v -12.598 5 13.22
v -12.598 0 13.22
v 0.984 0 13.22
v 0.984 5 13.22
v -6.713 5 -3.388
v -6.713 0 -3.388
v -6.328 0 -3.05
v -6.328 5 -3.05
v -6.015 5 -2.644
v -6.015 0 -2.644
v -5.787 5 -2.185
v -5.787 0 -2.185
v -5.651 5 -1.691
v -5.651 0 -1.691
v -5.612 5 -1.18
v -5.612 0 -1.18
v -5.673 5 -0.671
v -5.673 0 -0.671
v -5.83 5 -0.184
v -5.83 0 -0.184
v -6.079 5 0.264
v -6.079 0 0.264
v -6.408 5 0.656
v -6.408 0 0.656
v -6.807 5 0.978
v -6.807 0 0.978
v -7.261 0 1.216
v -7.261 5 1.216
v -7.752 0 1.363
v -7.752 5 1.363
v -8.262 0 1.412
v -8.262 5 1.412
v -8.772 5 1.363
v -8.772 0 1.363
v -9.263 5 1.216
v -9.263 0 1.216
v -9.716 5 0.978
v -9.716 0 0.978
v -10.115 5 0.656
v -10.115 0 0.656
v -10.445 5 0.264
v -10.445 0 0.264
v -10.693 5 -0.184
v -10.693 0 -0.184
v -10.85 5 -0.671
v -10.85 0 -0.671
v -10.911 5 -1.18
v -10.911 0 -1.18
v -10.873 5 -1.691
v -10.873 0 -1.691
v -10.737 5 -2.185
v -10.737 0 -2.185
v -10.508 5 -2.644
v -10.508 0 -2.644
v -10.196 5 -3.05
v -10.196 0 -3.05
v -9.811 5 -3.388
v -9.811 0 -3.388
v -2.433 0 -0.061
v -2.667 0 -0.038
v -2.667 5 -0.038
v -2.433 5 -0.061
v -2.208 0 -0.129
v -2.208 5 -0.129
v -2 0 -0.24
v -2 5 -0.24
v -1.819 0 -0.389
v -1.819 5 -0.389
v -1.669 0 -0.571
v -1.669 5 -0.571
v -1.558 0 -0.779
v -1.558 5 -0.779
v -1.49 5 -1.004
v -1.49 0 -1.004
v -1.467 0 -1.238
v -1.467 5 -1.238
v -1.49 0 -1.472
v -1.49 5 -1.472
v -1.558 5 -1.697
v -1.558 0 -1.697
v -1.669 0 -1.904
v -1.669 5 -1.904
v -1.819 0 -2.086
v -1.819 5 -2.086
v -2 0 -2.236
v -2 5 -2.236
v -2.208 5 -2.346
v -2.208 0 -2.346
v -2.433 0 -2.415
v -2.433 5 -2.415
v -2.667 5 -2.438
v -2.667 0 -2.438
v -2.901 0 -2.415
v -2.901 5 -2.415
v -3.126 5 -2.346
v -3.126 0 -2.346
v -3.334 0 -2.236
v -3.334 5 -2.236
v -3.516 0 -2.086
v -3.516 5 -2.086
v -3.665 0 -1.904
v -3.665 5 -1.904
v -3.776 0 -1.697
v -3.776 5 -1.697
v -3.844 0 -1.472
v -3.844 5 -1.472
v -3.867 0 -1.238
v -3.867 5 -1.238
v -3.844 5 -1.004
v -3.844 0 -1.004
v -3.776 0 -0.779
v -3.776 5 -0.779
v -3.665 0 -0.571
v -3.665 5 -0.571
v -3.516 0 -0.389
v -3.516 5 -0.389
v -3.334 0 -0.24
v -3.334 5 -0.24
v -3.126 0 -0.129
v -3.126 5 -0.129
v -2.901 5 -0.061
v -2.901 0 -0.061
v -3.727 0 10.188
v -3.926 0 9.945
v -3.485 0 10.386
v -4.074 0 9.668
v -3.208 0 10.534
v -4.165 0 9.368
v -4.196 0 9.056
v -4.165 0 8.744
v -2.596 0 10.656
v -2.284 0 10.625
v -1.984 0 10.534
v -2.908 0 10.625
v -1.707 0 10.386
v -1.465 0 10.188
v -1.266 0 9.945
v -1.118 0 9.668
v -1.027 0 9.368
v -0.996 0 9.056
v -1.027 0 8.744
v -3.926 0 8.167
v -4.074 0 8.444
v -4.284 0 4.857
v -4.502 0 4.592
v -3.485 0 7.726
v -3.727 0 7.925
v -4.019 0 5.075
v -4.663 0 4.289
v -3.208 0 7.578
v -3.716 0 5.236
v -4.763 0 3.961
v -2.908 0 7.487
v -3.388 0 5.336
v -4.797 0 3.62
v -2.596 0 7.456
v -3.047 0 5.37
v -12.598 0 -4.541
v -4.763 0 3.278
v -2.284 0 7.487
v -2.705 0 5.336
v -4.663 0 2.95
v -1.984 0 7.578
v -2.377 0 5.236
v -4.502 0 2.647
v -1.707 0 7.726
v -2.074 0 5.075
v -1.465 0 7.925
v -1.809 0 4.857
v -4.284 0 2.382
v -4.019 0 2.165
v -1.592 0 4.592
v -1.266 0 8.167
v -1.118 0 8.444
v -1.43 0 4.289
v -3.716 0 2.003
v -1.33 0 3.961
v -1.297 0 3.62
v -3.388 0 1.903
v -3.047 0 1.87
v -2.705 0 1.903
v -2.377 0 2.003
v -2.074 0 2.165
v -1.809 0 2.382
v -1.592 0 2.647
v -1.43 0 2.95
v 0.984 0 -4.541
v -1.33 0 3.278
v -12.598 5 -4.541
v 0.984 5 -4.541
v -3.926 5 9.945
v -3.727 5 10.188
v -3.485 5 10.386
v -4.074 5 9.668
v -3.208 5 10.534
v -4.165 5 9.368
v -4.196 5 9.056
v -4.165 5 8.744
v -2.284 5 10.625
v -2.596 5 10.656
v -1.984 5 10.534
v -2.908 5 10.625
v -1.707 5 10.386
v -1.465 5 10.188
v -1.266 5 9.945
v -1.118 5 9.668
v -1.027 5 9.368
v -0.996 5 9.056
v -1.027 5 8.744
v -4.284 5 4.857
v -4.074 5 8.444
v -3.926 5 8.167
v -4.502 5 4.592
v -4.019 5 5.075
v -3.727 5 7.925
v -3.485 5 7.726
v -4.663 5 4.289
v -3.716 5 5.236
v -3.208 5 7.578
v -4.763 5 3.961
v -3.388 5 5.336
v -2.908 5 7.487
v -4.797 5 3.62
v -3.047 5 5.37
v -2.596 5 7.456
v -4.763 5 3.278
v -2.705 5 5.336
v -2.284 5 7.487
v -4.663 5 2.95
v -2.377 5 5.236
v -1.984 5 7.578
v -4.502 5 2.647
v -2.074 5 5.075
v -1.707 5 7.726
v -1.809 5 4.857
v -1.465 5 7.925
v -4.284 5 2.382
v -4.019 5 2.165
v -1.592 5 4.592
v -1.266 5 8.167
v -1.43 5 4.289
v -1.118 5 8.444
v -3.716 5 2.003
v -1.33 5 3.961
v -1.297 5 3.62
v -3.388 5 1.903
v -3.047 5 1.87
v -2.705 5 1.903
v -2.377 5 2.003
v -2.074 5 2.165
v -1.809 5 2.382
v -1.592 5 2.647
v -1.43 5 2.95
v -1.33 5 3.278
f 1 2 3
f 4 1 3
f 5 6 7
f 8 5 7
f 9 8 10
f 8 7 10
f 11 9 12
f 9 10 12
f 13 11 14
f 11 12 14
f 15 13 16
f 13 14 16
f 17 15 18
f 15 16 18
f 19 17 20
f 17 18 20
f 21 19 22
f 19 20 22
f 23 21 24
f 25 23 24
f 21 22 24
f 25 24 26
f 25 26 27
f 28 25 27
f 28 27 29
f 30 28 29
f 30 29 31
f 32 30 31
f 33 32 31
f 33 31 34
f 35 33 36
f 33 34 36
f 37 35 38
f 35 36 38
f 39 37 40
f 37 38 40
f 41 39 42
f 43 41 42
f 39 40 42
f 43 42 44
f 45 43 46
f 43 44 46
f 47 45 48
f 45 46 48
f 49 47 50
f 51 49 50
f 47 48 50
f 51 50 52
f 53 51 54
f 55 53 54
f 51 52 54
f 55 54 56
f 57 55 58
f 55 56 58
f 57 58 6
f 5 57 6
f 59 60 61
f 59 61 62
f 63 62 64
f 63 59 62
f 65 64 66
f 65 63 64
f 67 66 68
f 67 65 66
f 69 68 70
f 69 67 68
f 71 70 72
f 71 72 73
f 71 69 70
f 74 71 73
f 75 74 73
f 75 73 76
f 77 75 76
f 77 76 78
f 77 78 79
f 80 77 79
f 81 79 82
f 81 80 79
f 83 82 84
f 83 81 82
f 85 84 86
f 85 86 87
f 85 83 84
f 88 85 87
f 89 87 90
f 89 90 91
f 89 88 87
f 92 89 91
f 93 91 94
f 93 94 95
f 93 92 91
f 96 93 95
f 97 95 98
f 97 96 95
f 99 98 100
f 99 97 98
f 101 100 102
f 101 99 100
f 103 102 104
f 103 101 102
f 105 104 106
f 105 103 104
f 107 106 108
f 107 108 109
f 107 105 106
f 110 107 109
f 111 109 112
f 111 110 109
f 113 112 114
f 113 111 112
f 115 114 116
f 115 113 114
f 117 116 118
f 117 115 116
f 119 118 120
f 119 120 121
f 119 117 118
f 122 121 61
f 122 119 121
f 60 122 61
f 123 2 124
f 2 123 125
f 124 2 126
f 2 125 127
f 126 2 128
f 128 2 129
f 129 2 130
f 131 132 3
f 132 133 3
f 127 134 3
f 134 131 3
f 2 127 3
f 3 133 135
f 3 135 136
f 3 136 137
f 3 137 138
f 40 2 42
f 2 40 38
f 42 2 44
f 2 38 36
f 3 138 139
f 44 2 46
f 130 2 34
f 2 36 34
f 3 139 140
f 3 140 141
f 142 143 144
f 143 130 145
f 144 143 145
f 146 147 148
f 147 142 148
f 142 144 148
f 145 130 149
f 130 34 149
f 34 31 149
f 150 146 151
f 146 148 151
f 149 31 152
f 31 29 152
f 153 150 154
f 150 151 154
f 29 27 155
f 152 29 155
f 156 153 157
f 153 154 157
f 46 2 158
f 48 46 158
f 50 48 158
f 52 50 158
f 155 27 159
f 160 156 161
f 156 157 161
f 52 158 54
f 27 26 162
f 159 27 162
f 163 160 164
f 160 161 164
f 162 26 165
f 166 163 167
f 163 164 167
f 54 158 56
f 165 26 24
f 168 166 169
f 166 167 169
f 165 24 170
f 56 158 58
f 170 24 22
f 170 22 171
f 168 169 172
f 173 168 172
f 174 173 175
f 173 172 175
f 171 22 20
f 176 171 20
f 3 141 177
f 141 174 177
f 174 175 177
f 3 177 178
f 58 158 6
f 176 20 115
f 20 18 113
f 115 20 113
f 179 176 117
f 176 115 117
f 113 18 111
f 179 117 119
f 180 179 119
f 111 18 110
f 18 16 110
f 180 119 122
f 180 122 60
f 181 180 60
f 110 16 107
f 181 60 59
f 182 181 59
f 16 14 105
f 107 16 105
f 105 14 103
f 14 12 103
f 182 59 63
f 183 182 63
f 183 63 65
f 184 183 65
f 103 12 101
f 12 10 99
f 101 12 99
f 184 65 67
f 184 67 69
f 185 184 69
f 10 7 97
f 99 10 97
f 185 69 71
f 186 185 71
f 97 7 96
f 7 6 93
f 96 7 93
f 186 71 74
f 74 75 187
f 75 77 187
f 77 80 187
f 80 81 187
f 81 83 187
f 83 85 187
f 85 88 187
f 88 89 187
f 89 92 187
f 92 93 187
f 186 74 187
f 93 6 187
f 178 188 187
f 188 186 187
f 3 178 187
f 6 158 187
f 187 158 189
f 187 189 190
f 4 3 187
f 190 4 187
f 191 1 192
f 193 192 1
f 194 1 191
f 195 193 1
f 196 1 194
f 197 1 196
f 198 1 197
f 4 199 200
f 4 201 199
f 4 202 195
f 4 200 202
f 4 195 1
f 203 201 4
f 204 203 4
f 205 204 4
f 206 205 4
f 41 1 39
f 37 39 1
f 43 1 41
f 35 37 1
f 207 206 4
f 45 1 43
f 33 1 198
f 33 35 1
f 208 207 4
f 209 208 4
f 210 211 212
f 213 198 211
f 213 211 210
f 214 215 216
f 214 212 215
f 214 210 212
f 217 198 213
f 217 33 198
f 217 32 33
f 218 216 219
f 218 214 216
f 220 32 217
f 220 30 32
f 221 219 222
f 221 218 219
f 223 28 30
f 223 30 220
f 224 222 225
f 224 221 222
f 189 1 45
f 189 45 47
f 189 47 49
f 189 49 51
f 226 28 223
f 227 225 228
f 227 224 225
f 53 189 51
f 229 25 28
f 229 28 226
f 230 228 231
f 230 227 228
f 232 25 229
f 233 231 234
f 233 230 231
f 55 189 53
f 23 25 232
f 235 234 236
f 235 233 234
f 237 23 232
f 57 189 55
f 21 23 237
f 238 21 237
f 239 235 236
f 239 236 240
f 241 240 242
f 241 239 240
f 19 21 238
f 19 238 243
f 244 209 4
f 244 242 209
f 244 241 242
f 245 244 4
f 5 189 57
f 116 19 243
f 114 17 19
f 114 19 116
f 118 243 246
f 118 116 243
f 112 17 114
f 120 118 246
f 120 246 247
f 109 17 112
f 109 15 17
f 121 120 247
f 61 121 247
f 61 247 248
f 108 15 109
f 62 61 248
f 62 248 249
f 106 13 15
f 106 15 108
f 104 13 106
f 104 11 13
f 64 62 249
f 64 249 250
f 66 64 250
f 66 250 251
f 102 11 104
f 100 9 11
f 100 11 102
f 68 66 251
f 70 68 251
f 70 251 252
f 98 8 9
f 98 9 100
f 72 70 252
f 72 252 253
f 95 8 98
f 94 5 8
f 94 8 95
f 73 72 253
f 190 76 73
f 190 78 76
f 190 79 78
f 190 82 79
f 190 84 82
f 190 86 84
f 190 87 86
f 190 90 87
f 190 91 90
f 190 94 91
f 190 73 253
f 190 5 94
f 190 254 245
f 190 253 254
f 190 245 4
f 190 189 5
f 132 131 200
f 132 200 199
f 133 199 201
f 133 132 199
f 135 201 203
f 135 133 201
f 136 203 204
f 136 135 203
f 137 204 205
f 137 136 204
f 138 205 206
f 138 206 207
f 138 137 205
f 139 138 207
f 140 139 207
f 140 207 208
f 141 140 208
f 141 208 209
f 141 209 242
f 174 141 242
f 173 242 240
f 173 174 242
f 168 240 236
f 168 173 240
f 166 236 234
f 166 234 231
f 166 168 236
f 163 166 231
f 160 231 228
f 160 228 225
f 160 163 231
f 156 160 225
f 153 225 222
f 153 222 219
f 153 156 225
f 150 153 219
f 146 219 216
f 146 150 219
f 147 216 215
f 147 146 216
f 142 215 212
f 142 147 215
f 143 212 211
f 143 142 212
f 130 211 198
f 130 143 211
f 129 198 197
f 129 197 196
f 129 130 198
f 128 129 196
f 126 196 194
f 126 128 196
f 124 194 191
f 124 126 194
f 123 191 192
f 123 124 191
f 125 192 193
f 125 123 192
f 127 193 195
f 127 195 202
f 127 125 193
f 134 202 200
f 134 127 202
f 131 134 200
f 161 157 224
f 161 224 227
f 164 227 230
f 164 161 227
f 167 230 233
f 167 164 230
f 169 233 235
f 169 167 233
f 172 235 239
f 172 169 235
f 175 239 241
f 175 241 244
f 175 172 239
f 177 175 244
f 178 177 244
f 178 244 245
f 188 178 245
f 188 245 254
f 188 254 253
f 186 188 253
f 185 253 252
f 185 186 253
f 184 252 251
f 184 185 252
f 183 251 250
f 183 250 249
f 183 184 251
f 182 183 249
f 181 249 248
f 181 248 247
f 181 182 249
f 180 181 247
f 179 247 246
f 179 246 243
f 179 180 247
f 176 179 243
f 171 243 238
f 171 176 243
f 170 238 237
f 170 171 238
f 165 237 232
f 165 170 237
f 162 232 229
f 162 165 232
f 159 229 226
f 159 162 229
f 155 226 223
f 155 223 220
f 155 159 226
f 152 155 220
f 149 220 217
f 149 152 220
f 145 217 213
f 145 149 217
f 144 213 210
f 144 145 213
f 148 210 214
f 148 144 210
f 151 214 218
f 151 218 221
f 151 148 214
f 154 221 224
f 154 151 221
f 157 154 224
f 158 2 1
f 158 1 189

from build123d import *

# Parameters (mm, degrees)
SKETCH1_W           = 13.581948161
SKETCH1_H           = 17.761009134
SKETCH1_R           = 1.6
SKETCH1_R_2         = 1.2
SKETCH1_R_3         = 1.75
BOSS_EXTRUDE1_DEPTH = 5


with BuildPart() as part:
    # Sketch1 → Boss-Extrude1 (new body)
    with BuildSketch(Plane(origin=(0, 0, 0), x_dir=(1, 0, 0), z_dir=(0, 1, 0))):
        with Locations((-5.80679888, -4.339957405)):
            Rectangle(SKETCH1_W, SKETCH1_H)
        with Locations(Location((-2.596056365, -9.056132184, 0), (0, 0, 270))):
            Circle(SKETCH1_R, mode=Mode.SUBTRACT)
        with Locations(Location((-2.667047062, 1.237786047, 0), (0, 0, 270))):
            Circle(SKETCH1_R_2, mode=Mode.SUBTRACT)
        with Locations(Location((-3.046693025, -3.619626487, 0), (0, 0, 270))):
            Circle(SKETCH1_R_3, mode=Mode.SUBTRACT)
        with BuildLine():
            Line((-9.810909871, 3.387786047), (-6.712523194, 3.387786047))
            ThreePointArc((-6.712523194, 3.387786047), (-8.261716533, -1.412213953), (-9.810909871, 3.387786047))
        make_face(mode=Mode.SUBTRACT)
    extrude(amount=BOSS_EXTRUDE1_DEPTH)


solid = part.part
